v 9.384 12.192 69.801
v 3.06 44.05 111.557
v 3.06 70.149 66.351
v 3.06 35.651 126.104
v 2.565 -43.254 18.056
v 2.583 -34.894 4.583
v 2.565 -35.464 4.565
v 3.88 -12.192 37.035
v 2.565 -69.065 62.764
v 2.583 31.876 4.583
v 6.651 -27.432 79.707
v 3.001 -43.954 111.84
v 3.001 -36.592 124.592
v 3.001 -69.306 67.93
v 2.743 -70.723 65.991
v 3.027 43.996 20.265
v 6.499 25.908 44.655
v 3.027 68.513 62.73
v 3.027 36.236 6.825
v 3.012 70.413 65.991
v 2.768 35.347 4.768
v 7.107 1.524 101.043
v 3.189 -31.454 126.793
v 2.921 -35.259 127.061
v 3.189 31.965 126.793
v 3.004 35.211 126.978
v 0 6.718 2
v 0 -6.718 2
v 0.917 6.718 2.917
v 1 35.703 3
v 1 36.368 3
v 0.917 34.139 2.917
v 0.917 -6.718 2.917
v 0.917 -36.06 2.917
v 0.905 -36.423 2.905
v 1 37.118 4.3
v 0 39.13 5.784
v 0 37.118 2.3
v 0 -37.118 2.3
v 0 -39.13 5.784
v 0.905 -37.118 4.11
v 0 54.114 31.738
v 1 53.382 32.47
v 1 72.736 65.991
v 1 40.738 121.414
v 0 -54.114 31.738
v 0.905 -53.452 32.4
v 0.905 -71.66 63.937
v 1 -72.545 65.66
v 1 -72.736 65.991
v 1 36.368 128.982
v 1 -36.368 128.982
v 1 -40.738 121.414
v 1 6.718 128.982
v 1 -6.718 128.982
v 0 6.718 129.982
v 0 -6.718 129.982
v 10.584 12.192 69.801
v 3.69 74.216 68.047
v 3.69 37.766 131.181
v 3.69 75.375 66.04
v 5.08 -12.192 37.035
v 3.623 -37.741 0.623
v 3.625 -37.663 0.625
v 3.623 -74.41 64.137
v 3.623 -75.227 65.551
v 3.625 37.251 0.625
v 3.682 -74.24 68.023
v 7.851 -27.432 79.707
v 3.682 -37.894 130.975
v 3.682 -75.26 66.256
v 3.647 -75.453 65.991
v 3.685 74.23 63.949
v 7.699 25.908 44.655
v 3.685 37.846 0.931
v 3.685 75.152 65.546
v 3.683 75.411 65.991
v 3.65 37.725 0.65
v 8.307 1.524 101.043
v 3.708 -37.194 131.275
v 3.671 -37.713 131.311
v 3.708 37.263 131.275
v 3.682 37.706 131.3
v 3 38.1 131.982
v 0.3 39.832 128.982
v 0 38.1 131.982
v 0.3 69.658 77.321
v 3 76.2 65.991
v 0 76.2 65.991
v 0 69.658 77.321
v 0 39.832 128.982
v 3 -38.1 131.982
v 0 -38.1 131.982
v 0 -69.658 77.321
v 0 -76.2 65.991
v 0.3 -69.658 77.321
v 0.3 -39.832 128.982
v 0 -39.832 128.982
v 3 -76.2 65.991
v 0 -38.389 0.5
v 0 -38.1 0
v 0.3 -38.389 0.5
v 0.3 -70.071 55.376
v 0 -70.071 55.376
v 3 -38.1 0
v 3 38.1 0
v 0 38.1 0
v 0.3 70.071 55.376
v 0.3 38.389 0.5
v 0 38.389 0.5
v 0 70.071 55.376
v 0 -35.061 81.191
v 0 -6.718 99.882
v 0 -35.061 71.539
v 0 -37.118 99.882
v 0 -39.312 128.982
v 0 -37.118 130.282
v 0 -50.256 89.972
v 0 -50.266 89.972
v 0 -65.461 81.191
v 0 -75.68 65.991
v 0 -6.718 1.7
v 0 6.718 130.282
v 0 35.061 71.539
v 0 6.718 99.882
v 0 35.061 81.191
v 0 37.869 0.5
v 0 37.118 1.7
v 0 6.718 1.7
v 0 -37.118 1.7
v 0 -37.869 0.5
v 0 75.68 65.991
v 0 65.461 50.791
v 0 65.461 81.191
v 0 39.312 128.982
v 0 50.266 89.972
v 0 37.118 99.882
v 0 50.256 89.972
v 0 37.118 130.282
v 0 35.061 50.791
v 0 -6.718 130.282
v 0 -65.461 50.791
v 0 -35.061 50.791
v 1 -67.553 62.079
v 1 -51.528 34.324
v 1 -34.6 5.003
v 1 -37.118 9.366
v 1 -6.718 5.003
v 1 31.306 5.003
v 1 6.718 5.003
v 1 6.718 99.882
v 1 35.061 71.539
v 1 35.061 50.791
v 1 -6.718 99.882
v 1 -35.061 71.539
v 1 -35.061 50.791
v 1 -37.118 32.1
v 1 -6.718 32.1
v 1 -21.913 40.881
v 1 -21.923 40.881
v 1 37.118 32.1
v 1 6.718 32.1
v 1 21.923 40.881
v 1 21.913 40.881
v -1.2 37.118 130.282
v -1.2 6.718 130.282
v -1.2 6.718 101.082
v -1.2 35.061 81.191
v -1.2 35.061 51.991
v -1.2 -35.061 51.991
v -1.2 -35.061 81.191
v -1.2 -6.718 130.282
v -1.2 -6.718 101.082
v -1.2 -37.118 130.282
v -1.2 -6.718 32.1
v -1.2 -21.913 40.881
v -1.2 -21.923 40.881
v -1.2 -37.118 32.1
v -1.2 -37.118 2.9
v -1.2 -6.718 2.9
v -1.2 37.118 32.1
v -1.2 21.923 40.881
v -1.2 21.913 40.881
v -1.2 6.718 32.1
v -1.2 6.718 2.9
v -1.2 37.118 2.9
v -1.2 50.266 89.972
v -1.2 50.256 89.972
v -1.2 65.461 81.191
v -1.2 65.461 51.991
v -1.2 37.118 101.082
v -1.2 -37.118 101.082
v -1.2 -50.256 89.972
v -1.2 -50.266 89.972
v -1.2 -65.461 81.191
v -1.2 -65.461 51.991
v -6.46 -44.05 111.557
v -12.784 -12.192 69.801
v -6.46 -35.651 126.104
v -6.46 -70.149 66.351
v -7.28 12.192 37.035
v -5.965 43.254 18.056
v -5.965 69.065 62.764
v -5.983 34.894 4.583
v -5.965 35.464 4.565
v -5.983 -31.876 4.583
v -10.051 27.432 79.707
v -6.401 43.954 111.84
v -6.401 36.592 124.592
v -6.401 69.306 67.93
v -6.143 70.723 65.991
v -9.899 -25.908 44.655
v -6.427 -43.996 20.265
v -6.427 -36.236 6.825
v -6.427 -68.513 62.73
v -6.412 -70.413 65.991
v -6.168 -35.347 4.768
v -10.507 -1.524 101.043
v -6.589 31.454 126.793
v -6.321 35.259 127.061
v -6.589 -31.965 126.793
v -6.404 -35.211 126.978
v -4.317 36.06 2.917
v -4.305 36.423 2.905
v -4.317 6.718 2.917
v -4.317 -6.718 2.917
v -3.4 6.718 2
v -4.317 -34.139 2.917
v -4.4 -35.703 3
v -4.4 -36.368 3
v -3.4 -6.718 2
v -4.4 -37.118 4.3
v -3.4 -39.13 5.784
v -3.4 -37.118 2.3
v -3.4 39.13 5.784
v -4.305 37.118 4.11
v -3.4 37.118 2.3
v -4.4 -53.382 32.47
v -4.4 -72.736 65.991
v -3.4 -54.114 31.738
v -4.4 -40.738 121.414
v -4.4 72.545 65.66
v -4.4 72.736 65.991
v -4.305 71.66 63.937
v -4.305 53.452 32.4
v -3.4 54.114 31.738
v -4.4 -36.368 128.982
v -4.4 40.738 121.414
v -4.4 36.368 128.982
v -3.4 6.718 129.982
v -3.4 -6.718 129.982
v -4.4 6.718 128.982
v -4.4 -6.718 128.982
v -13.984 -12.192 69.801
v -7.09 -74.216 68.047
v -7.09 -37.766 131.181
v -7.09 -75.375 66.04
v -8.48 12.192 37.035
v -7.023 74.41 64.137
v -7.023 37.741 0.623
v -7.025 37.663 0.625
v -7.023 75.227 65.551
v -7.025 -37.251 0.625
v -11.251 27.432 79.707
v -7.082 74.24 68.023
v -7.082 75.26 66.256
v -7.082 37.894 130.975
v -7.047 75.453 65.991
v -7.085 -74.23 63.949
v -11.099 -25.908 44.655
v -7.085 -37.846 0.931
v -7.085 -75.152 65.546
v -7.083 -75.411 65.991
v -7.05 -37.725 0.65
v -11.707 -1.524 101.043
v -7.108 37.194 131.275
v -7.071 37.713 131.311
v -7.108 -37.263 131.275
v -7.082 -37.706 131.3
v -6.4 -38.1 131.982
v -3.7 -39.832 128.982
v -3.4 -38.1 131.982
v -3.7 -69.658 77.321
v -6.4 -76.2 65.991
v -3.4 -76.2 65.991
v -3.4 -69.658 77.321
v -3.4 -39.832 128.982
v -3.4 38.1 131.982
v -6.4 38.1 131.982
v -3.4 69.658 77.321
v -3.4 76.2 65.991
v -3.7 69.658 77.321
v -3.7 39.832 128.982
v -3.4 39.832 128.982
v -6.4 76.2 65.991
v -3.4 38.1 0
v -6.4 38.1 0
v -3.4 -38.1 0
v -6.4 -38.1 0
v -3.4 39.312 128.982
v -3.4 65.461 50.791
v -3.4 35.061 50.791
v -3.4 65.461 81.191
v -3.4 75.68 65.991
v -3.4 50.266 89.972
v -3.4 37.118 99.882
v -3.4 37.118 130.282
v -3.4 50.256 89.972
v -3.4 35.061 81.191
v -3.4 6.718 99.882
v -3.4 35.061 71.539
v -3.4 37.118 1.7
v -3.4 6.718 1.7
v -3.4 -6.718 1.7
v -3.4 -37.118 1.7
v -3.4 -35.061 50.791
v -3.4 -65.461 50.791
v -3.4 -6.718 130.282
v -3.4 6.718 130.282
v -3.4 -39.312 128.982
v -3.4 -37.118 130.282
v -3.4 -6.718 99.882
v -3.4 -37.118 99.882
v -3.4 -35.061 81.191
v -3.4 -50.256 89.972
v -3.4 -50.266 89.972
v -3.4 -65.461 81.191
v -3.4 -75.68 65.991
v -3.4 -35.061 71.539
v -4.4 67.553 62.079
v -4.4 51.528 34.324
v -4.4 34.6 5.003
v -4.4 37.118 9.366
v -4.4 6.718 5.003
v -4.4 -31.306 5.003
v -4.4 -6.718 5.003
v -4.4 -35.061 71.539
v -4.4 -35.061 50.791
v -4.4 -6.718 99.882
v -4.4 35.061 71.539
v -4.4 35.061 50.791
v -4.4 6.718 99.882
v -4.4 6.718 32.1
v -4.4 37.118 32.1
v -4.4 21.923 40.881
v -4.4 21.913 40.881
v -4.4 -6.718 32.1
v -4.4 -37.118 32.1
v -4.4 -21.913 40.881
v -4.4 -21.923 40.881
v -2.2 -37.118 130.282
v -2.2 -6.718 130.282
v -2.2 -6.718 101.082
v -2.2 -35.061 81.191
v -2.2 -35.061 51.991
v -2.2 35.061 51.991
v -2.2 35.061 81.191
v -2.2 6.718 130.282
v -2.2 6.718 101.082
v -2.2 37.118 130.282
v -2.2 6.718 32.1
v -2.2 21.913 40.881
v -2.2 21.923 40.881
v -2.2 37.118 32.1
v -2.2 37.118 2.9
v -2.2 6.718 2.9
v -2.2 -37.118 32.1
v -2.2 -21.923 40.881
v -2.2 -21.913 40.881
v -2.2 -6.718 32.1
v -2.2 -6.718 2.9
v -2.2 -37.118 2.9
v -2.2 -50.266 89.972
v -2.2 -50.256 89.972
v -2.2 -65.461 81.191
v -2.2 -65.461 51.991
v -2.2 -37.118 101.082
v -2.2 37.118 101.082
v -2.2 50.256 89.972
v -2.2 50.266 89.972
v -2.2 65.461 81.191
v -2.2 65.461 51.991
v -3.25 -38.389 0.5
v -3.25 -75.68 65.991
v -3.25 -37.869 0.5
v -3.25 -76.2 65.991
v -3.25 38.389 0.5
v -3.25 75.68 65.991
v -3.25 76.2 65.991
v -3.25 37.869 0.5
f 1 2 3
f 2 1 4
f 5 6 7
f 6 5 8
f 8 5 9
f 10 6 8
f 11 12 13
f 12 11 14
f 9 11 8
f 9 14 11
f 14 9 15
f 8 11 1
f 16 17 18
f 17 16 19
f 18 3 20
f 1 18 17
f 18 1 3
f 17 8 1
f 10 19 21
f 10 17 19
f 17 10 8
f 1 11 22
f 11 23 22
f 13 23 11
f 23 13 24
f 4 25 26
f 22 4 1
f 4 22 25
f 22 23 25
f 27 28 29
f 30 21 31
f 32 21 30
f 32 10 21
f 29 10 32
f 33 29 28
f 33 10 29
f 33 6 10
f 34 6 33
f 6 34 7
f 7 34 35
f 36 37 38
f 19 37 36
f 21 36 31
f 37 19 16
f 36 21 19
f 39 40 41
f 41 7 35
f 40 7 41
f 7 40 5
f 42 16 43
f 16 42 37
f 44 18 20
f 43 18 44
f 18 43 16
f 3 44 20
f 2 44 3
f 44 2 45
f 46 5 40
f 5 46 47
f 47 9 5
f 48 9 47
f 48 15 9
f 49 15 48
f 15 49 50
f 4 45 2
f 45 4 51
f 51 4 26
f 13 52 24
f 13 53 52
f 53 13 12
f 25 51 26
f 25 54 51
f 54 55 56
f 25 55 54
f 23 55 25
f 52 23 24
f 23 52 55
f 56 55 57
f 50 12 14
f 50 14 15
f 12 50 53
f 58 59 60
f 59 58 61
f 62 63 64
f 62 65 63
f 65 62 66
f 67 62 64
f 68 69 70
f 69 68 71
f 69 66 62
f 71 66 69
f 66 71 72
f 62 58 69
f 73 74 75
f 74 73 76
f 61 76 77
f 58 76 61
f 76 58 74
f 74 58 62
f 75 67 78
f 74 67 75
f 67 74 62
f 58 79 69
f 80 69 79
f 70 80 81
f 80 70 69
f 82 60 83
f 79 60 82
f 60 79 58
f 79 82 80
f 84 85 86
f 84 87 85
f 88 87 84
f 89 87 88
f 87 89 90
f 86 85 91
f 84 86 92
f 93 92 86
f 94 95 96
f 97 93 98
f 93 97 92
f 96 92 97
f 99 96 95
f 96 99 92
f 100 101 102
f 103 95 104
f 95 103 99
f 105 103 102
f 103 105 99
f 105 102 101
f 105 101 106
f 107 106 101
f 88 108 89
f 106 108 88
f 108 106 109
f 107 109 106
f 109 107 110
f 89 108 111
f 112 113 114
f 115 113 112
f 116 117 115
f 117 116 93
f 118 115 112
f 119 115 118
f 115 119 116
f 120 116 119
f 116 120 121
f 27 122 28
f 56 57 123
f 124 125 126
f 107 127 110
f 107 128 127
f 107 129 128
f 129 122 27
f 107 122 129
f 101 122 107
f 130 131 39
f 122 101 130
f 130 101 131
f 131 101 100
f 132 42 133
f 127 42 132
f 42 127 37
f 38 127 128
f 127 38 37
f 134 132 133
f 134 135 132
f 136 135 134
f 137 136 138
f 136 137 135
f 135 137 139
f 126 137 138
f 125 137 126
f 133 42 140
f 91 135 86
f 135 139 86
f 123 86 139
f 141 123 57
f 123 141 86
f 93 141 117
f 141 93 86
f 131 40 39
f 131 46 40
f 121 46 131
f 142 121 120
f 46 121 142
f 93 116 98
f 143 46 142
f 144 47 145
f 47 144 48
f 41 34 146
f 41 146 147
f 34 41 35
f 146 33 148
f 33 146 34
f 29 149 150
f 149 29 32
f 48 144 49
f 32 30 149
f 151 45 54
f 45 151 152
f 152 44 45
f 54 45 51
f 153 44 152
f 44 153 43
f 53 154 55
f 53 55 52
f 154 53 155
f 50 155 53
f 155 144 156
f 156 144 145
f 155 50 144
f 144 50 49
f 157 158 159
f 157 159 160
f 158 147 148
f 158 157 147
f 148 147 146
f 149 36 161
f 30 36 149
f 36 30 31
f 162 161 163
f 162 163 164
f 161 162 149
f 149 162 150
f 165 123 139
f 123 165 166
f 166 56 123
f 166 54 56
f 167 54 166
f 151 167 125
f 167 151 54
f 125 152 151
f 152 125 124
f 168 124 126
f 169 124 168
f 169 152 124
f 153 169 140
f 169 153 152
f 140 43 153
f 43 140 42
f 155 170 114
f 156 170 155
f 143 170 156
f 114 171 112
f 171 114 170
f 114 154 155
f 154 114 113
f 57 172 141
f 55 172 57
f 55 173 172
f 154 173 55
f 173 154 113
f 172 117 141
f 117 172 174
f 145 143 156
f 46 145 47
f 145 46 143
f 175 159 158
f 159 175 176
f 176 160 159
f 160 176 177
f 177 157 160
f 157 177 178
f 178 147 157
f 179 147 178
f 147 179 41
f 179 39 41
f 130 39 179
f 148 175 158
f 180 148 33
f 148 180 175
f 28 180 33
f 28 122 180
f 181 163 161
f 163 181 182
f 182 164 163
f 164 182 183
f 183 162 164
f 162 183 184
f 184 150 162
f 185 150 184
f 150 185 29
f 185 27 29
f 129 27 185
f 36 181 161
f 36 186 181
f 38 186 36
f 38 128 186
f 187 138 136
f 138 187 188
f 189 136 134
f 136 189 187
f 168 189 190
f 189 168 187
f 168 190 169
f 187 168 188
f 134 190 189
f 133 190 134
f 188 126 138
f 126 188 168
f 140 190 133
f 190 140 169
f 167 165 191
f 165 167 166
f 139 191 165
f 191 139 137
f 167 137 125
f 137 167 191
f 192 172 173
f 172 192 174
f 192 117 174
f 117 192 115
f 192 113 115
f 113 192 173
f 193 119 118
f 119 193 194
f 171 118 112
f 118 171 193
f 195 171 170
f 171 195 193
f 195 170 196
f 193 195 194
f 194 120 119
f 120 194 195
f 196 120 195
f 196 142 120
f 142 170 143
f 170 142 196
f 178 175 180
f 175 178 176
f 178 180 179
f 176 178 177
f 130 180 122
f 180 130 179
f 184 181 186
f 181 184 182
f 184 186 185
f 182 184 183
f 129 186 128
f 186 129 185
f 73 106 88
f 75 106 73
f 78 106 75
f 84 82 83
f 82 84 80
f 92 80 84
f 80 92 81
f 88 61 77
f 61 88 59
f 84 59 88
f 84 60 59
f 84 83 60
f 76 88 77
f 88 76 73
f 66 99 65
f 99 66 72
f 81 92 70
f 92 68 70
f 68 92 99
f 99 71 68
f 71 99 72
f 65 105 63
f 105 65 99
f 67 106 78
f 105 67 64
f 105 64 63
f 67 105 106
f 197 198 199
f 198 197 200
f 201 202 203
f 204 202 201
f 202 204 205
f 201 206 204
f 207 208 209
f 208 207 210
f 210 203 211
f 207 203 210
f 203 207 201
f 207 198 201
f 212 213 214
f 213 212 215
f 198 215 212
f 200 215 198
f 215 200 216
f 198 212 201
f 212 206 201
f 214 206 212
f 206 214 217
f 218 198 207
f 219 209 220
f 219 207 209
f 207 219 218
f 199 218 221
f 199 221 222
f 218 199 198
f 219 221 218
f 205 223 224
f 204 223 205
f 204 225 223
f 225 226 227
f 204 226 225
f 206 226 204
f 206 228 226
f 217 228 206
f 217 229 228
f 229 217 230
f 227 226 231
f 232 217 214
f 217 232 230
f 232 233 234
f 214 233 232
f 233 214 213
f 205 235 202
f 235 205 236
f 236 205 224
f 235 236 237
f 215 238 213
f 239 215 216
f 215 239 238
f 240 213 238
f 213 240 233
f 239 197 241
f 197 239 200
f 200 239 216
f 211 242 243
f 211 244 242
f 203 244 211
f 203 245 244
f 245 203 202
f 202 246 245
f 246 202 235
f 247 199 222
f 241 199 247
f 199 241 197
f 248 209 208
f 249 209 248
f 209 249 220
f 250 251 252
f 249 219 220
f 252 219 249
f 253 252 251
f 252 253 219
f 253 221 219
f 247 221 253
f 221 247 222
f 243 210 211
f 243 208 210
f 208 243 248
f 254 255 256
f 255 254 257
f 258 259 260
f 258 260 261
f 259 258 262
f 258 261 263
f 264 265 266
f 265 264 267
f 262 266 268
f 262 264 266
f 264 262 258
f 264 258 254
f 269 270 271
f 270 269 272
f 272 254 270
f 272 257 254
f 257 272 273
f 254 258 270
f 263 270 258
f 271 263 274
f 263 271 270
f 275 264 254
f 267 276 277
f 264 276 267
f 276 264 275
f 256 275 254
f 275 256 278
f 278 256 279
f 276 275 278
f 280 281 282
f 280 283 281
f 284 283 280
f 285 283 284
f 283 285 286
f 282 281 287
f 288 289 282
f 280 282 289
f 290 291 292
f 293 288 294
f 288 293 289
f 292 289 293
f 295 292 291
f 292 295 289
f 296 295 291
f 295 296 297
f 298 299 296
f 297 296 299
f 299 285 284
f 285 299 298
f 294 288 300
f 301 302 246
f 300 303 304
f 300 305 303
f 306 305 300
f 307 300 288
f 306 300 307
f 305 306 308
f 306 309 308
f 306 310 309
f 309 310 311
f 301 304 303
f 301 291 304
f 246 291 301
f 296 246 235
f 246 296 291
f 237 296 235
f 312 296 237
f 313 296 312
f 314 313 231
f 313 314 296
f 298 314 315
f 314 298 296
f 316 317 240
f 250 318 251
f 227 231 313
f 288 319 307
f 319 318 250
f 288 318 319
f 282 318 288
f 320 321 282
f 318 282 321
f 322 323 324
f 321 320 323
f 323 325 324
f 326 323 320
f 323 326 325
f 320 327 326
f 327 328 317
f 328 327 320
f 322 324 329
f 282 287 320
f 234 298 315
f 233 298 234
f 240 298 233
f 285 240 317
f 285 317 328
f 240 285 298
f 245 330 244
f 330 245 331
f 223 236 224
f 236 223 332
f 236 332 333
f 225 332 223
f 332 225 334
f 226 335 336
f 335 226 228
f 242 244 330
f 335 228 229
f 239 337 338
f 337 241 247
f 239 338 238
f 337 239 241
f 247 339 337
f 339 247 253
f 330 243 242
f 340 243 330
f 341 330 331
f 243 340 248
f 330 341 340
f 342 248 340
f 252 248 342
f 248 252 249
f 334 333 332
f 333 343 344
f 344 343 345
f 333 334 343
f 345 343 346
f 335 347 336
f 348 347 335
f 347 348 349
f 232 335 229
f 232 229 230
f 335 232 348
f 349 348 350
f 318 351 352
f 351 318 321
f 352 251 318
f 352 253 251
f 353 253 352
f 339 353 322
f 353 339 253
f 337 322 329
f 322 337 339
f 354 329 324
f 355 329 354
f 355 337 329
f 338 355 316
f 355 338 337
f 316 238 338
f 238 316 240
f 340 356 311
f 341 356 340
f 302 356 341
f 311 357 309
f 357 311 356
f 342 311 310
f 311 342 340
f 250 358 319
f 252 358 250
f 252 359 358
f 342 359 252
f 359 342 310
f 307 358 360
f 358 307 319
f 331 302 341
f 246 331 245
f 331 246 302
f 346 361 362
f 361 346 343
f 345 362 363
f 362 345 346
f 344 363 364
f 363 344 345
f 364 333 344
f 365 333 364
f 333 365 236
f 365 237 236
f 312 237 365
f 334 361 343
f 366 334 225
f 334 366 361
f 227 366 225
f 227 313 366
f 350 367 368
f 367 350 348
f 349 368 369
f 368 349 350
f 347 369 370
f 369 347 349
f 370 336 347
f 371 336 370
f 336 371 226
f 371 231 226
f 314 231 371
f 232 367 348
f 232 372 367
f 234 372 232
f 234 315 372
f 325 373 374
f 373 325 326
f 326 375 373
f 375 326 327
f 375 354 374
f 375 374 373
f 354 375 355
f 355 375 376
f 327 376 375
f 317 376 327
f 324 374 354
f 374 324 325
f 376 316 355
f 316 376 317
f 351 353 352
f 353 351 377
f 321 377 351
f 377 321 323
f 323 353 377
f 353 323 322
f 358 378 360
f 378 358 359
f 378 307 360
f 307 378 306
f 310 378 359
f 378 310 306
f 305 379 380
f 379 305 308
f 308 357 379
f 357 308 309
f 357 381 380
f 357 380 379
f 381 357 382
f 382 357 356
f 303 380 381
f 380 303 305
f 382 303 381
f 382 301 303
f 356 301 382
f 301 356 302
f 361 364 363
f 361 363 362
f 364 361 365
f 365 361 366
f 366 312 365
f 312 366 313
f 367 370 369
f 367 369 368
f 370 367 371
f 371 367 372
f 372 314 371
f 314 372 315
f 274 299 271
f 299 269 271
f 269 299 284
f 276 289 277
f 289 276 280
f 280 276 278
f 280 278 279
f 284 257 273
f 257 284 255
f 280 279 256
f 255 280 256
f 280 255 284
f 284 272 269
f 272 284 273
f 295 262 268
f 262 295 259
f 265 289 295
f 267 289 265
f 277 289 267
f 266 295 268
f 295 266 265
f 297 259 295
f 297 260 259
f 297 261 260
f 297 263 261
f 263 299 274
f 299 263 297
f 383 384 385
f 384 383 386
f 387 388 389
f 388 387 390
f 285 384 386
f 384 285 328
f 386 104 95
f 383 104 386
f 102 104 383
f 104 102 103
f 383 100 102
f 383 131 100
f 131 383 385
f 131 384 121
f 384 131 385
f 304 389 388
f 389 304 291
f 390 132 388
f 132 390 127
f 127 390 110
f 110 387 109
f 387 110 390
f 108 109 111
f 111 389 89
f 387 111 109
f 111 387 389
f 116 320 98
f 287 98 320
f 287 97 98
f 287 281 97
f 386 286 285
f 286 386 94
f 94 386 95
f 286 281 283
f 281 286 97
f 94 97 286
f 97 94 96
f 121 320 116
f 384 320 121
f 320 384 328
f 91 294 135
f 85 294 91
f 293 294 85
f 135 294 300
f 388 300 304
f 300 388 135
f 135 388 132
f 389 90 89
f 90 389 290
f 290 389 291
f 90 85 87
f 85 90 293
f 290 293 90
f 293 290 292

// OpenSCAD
// Hexagon wall tile v53 — parametric rebuild of v30
// Front: identical low-poly facets to v30 (same facet angles at every size).
// Edge profile: identical on every size (edge depth, rim width) so tiles butt flush.
// Back: six corner pads for 1" (25 mm) double-sided mounting tape.
// v32: tape pads are flat plates hung from the rim with an air gap to the front skin.
// v33: thinner skin + thinner pads so the air gap is 1.4 mm even right at the edges
//      (v32 had only 0.8 mm there and showed marks along the slanted edges).
// v34: snap-off stabilizer fins behind the bottom edge so the tall, thin tile can't tip over
//      while printing. Break them off afterwards (bend sideways) and the back stays flat.
// v35: 0.6 mm 45° chamfer on the front edge (crisp, consistent shadow line between tiles; hides
//      first-layer squish and brim trim marks) + relief_scale to deepen the facets if wanted.
// v37: much smaller breakaway tabs (0.8 x 0.6 mm, every 8 mm) so the fins snap off easily.
// v38: full-height snap-off BRACE FRAME behind the tile: a thin hex ring + X/vertical bars,
//      1 mm behind the back, tied to the tile rim by tiny tabs all the way round (incl. the top).
//      Tile + brace act as a stiff box while printing; the fins now sit on the brace.
//      Peel the brace off after printing — the tabs only touch the back rim.
// v39: PAIR mode (default): two identical tiles printed back-to-back, 0.4 mm apart, so each
//      cradles the other full-height. Only 12 tiny tabs (corners + mid-sides) join the back
//      rims — twist/peel the tiles apart. No brace, no fins, almost no waste. The pair is
//      turned 90° on the bed so the 'back' seam lands on a side edge, not on either face.
// v40: pair tabs spaced evenly every ~pair_tab_pitch mm round the rim on EVERY size. In v39 the
//      tab spacing grew with the tile (3": ~23 mm max gap, 6": ~46 mm, 10": ~79 mm), so the 3" pair
//      printed perfectly but the 6" rims flexed apart between tabs and broke up above mid-height.
//      Now every size has the same tab spacing as a stiff 3" pair (or tighter).
// v42: tabs replaced by one continuous hairline SEAM round the outer edge of the pair gap.
//      Discrete tabs changed the toolpath on every layer that had a tab, leaving a faint line
//      across the tile every ~10 mm of height. With a continuous seam every layer has the same
//      shape, so there is nothing to print differently. Separate the tiles by running a utility
//      knife along the seam line on the edges, then twist apart.
// v43: stiffer tape pads — each pad now grows from the back plane toward the front until it is
//      pad_gap (1.4 mm) from the skin, instead of being a 1 mm plate (the skin stays untouched, so
//      no ghost lines). Larger tiles (>= mid_pad_min_in)
//      get four extra pads at the slanted mid-edges: 10 tape spots on the 10".
// v44: UNIFORM pads. Every pad is the same PAD x PAD tape square, pushed snug into its corner
//      (touching both rims), with only a small 45° gusset beneath it down to the rim so it prints
//      without support. Because a hex corner is the same angle at every size, the 6" and 10" pads
//      are identical in shape and size; the 3" uses the same layout with smaller squares.
//      The 10" adds the same square at the middle of each slanted edge.
// v46: pads are a 1 mm plate with a stiffening LIP round the free edges (like a shallow tray),
//      instead of solid-filled — nearly the stiffness of v44's deep pads at close to v42 print time.
// v47: pair gap 0.4 -> 1.0 mm. At 0.4 mm the squashed back walls of the two tiles touched and
//      fused, so v42-v46 pairs would not come apart. At 1.0 mm only the hairline edge seam joins
//      them: cut it with a utility knife (there is now room for the blade) and they separate.
// v48: seam only on the four SLANTED edges. The top and bottom flat edges are left open (a 1 mm
//      slot), so a putty knife / flat screwdriver can go in and pry the pair open, unzipping the
//      seam. Every layer still crosses the seam at both ends, so the layer shape stays constant.
// v49: "KISS" seam — the seam is printed on ONE tile only and stops seam_kiss short of the other
//      tile's back. The two tiles are never one solid: they only touch where the plastic squashes
//      out, which tacks them lightly (enough to steady them while printing, weak enough to snap by
//      hand). Set seam_kiss = 0 to go back to the fused v48 seam.
// v50: (1) every tape pad gets a 45° pointed top, so pads taper out over many layers instead of
//      ending on one layer. Abrupt pad ends changed the layer time suddenly and left a line across
//      the face (seen at ~14% and ~36% height on the 10").
//      (2) the stiffening lips stay lip_gap (2.5 mm) clear of the skin, not 1.4: near the edges the
//      lips were hugging the skin and ghosting through as ridges parallel to the edge.
// v51: STIFFER, LARGER TAPE PADS without touching the front edge profile:
//      - each tape SQUARE stands pad_proud (1.2 mm) proud of the back rim, so where the tape goes
//        the pad is ~2.2 mm thick (was 1 mm) — roughly 8-10x stiffer. The tile sits on its pads;
//        the rim floats ~1.2 mm + tape thickness off the wall. Support webs stay thin (print time).
//      - pads 30 mm square (fit 1" tape with margin), with a shallow 30° roof instead of a point.
//      - front kept cleaner: pads now stay pad_gap = 1.6 mm from the skin; no lips.
//      - pair gap grows to keep 1 mm between the two tiles' proud pads.
//      - seam now starts right at the bottom corners (no cantilevered start); pry slot along the top.
// v53: seam is FUSED (one printed line) on the two upper slanted edges and stays a light-contact
//      kiss seam on the lower two. The top half is where the pair wobbled (ripples near the top
//      corners); the switch happens at mid-height, where the hex corners already turn.
//      Separate: knife in the top slot, run down both upper edges, twist apart.
// Prints upright on a flat edge with NO supports (every downward edge is 45° or steeper).
//
// Export one size at a time, e.g.:
//   openscad -D size_in=6 -o hex_pair_v53_6in.stl hex_wall_tile_v53.scad

/* [Size] */
size_in       = 6;      // point-to-point width in inches (3, 6, 10 ...)

/* [Edge profile — keep identical across sizes] */
// Space behind the skin at the edge = edge_depth - skin; it must be >= pad_plate + pad_gap + pad_recess.
edge_depth    = 3.6;    // depth of the outer edge, back plane to front face (mm)
rim           = 2.0;    // perimeter wall thickness at the back plane (mm)
front_chamfer = 0.6;    // 45° chamfer on the front edge (mm); 0 = sharp edge

/* [Look] */
relief_scale  = 1.0;    // 1.0 = v30 facets; 1.5 = 50% deeper facets (same edge profile on all sizes)

/* [Front skin] */
skin          = 1.2;    // front skin thickness (mm) — 3 lines at 0.4 mm, same on all sizes

/* [Tape pads] */
tape_width    = 25.4;   // tape width (mm)
pad_margin    = 5;      // extra pad width beyond the tape (mm) -> 30.4 mm pads
pad_max_frac  = 0.45;   // pad never larger than this fraction of the tile radius (keeps 3" usable)
pad_plate     = 1.0;    // pad thickness in front of the back plane (mm), less where the skin is close
pad_proud     = 1.2;    // pads stand this far behind the back rim (mm) -> extra stiffness, no effect on the front
roof_angle    = 30;     // slope of the pad tops (deg) — tapers the pad end over several mm of height
pad_depth     = 0;         // stiffening lip depth (mm); always stops pad_gap from the skin
lip_gap       = 2.5;    // lips stop this far from the skin (plates keep pad_gap)
pad_lip       = 0.9;    // lip thickness (mm) — two lines
mid_pad_min_in = 8;     // tiles this size or larger also get pads at the four slanted mid-edges
pad_gap       = 1.6;    // minimum air gap between pads and the front skin (mm) — keeps the front clean
pad_recess    = 0;      // pads set back from the rim (mm); >0 lets the rim touch the wall,
                        // but near the edges the plate is then trimmed thinner to keep pad_gap

/* [Print stabilizers (snap off after printing)] */
stabilizers   = false;  // v34-v38 option; not needed in pair mode
fin_count     = 2;      // fins behind the bottom edge, placed symmetrically
fin_thick     = 1.6;    // fin thickness (mm)
fin_height_frac = 0.35; // fin height as a fraction of the tile height
fin_depth_frac  = 0.4;  // fin depth behind the brace as a fraction of fin height
fin_depth_min   = 15;   // (mm)
fin_gap       = 0.5;    // air gap between fin and tile back (mm)
tab_height    = 0.6;    // breakaway tab height (mm, vertical when printing) — 3 layers at 0.2
tab_width     = 0.8;    // breakaway tab width (mm), centred on the fin — 2 lines
tab_pitch     = 8;      // spacing between tabs (mm)

/* [Full-height brace frame (snap off after printing)] */
brace         = false;  // v38 option; not needed in pair mode
brace_gap     = 1.0;    // air gap between tile back and brace (mm)
brace_thick   = 1.6;    // brace thickness (mm)
brace_rim_w   = 4;      // width of the brace's hex ring (mm)
brace_bar_w   = 3;      // width of the X and vertical bars (mm)
brace_tab_pitch = 10;   // spacing of brace tabs along each rim side (mm)
brace_tab     = 0.8;    // brace tab size (mm) — tiny, so the brace peels off

/* [Back-to-back pair (default)] */
pair          = true;
pad_clear     = 1.0;    // air between the two tiles' proud pads (mm)
pair_gap      = pad_clear + 2*pad_proud;   // gap between the two back planes (mm)
pair_tab      = 0.6;    // tab size (mm) — tiny, so the pair twists apart
pair_tab_pitch = 12;    // (v40 tabs, unused when pair_seam_w > 0)
pair_seam_w   = 0.45;   // width of the continuous edge seam bridging the gap (mm) — about one line
seam_kiss     = 0.15;   // gap between the seam tip and the other tile (mm); 0 = fused seam
upper_fused   = true;   // v53: fuse the seam on the two upper slanted edges only
seam_open     = 3;      // leave the seam off this far from the top and bottom flat edges (mm) -> pry slots

/* [Output] */
orient_for_print = true; // stand upright on a flat edge, back facing +Y

/* [Hidden] */
R   = size_in * 25.4 / 2;         // corner radius
AP  = R * cos(30);                // apothem
PAD = min(tape_width + pad_margin, R * pad_max_frac);

// Normalised front geometry from v30 (x, y in units of R; z = relief above edge, units of R)
FP = [[1,0,0],[0.5,0.866025,0],[-0.5,0.866025,0],[-1,0,0],[-0.5,-0.866025,0],[0.5,-0.866025,0],
      [0.16,0.05,0.091654],[-0.16,-0.38,0.019428],[-0.36,0.18,0.05579],[0.34,-0.28,0.053795],[0.02,0.46,0.061766]];
FACES = [[0,6,1],[4,3,7],[5,4,7],[8,3,2],[7,3,8],[7,8,6],[5,9,0],[9,6,0],[9,7,6],[5,7,9],
         [6,8,10],[8,2,10],[6,10,1],[10,2,1],
         [1,12,11,0],[2,13,12,1],[3,14,13,2],[4,15,14,3],[5,16,15,4],[0,11,16,5],
         [11,12,13,14,15,16]];
RELIEF_MAX = 0.091654 * R * relief_scale;
D = edge_depth + RELIEF_MAX + 1;  // max depth used for chamfers

// Solid bounded by the faceted front (shifted by dz) and a flat back at z = zb
module body(dz = 0, zb = 0) {
    pts = concat(
        [for (p = FP) [p[0]*R, p[1]*R, edge_depth + p[2]*R*relief_scale + dz]],
        [for (i = [0:5]) [FP[i][0]*R, FP[i][1]*R, zb]]);
    polyhedron(points = pts, faces = FACES, convexity = 4);
}

module hex2d(apothem) { circle(r = apothem / cos(30), $fn = 6); }

// Back cavity: behind the skin, inside the rim; rim inner faces slope 45° so nothing needs support
module cavity(extra = 0) {
    H  = D + 2;
    a0 = AP - rim - extra + 1;             // apothem at z = -1
    intersection() {
        body(dz = -skin - extra, zb = -1);
        translate([0, 0, -1]) linear_extrude(height = H, scale = (a0 - H) / a0) hex2d(a0);
    }
}

// ---- Uniform tape pads ----------------------------------------------------------------
PA = AP - rim + 0.3;                    // inner apothem used for pads (0.3 mm overlap fuses them to the rim)
PH = PAD / 2;
function nrm(a) = [cos(a), sin(a)];
function lim(a) = PA - PH * (abs(cos(a)) + abs(sin(a)));     // max n.c for an axis-aligned PAD square
// centre of a PAD square snug in the corner at angle t (touches the two rims meeting there)
function corner_c(t) = let(n1 = nrm(t - 30), n2 = nrm(t + 30), b1 = lim(t - 30), b2 = lim(t + 30), d = sin(60))
    [(b1*n2[1] - b2*n1[1]) / d, (n1[0]*b2 - n2[0]*b1) / d];
// centre of a PAD square snug against the middle of the edge whose normal is at angle a
function edge_c(a) = lim(a) * nrm(a);
// downward 45° (or vertical) gusset direction toward the nearest rim below — printed upright, model -y is down
function gdir(t) = (cos(t) > 0.1) ? [1, -1] : (cos(t) < -0.1) ? [-1, -1] : [0, -1];

module pad_sq(c, dir) {
    intersection() {
        hex2d(PA);
        hull() {
            translate(c) square(PAD, center = true);
            translate(c + [0, PAD/2 + PAD/2*tan(roof_angle)]) square(0.01, center = true);   // shallow roof
            translate(c + dir * R) square(PAD, center = true);
        }
    }
}
module pad_fp(k)  { t = 60*k;      pad_sq(corner_c(t), (k == 4 || k == 5) ? [0, -1] : gdir(t)); }
module mid_fp(k)  { a = 30 + 60*k; pad_sq(edge_c(a),   (k == 3 || k == 5) ? [0, -1] : gdir(a)); }

module pad_fps() {
    for (k = [0:5]) pad_fp(k);
    if (size_in >= mid_pad_min_in) for (k = [0, 2, 3, 5]) mid_fp(k);
}
// proud part of one tape square: only the square itself (not its support web), with a 45° ramp
// at its lower edge so, printed upright, it grows out of the plate instead of starting as a ledge
module proud_sq(c) {
    intersection() {
        translate([0, 0, -pad_proud]) linear_extrude(pad_proud + 0.01)
            intersection() {
                hex2d(PA);
                hull() { translate(c) square(PAD, center = true);
                         translate(c + [0, PAD/2 + PAD/2*tan(roof_angle)]) square(0.01, center = true); }
            }
        translate([0, c[1] - PAD/2, 0])
            multmatrix([[1,0,0,0],[0,1,-1,0],[0,0,1,0]]) translate([-2*R, 0, -5]) cube([4*R, 4*R, 10]);
    }
}
module pads() {
    intersection() {                                       // tape plate in front of the back plane, pad_gap from the skin
        body(dz = -skin - pad_gap, zb = -1);
        linear_extrude(pad_plate) pad_fps();
    }
    for (k = [0:5]) proud_sq(corner_c(60*k));              // stiff proud tape squares behind it
    if (size_in >= mid_pad_min_in) for (k = [0, 2, 3, 5]) proud_sq(edge_c(30 + 60*k));
}

module chamfer_clip() {
    HB = D + 5;
    union() {
        translate([0, 0, -2]) linear_extrude(edge_depth - front_chamfer + 2) hex2d(AP + 1);
        translate([0, 0, edge_depth - front_chamfer]) linear_extrude(height = HB, scale = (AP - HB) / AP) hex2d(AP);
    }
}

module tile() {
    intersection() {
        union() {
            difference() { body(); cavity(); }
            pads();
        }
        if (front_chamfer > 0) chamfer_clip(); else translate([-2*R, -2*R, -5]) cube([4*R, 4*R, 4*R]);
    }
}

// Triangular fins standing on the bed behind the back (model z < 0), joined to the tile by small tabs
FIN_H = fin_height_frac * 2 * AP;
FIN_L = max(fin_depth_min, fin_depth_frac * FIN_H);
function fin_x(i) = (fin_count == 1) ? 0 : (-1 + 2 * i / (fin_count - 1)) * 0.35 * R;
BZ = brace ? brace_gap + brace_thick : 0;          // fins start behind the brace when it is used
module stabilizer_fins() {
    for (i = [0 : fin_count - 1]) {
        x = fin_x(i);
        fg = brace ? BZ - 0.3 : fin_gap;                // with a brace: fused into it (no tabs needed)
        hull() {                                            // fin: vertical triangle
            translate([x - fin_thick/2, -AP, -fg - FIN_L]) cube([fin_thick, 0.01, FIN_L]);
            translate([x - fin_thick/2, -AP, -fg - 0.01]) cube([fin_thick, FIN_H, 0.01]);
        }
        if (!brace)
            for (y = [0 : tab_pitch : FIN_H - tab_height])  // breakaway tabs into the back plane
                translate([x - tab_width/2, -AP + y, -fin_gap - 0.05]) cube([tab_width, tab_height, fin_gap + 0.35]);
    }
}

// Brace frame (2D, in the tile plane). Printed upright, so every downward-facing edge is >= 45°:
// the top bar is carried by 45° roofs in the two top windows; bars run vertical or at ±60°.
module brace_2d() {
    W  = brace_rim_w;
    Yt = AP - W;                                        // underside of the top ring bar
    difference() {
        hex2d(AP);
        intersection() {                                // the open window, with a 45° roof under the top bar
            hex2d(AP - W);
            // only the two top windows touch the top bar: give them a 45° valley roof
            polygon([[-2*R, -2*R], [2*R, -2*R], [2*R, 2*R], [R/2, 2*R], [R/2, Yt],
                     [0, Yt - R/2], [-R/2, Yt], [-R/2, 2*R], [-2*R, 2*R]]);
        }
    }
    intersection() {
        hex2d(AP);
        union() {
            square([brace_bar_w, 2*AP], center = true);                 // vertical bar
            rotate(60)  square([4*R, brace_bar_w], center = true);      // ±60° diagonals (corner to corner)
            rotate(-60) square([4*R, brace_bar_w], center = true);
        }
    }
}

module brace_frame() {
    translate([0, 0, -BZ]) linear_extrude(brace_thick) brace_2d();
    // tiny tabs across the gap, on the tile's back rim (1 mm in from the outline), all six sides
    for (k = [0:5]) {
        a0 = 60*k; a1 = 60*(k+1);
        p0 = [ (R - 1/sin(60)) * cos(a0), (R - 1/sin(60)) * sin(a0) ];
        p1 = [ (R - 1/sin(60)) * cos(a1), (R - 1/sin(60)) * sin(a1) ];
        L  = norm(p1 - p0);
        n  = floor((L - 6) / brace_tab_pitch);
        for (j = [0 : n]) {
            t = (3 + j * (L - 6) / max(n, 1)) / L;
            p = p0 + t * (p1 - p0);
            translate([p[0], p[1], -brace_gap - 0.3]) rotate(a0 + 120)
                translate([-brace_tab/2, -brace_tab/2, 0]) cube([brace_tab, brace_tab, brace_gap + 0.6]);
        }
    }
}

// Tabs across the pair gap, evenly spaced along each rim side (1 mm in from the outline)
module pair_tabs() {
    rr = R - 1/sin(60);
    n  = max(2, ceil(rr / pair_tab_pitch));          // side length = rr
    for (k = [0:5]) for (i = [0:n-1]) {
        f  = (i + 0.5) / n;
        a0 = 60*k; a1 = 60*(k+1);
        p = [rr*cos(a0), rr*sin(a0)] + f * ([rr*cos(a1), rr*sin(a1)] - [rr*cos(a0), rr*sin(a0)]);
        translate([p[0], p[1], -pair_gap - 0.3]) rotate(a0 + 120)
            translate([-pair_tab/2, -pair_tab/2, 0]) cube([pair_tab, pair_tab, pair_gap + 0.6]);
    }
}
// Continuous hairline seam round the outline, bridging the gap between the two back planes
// Seam strip along the slanted edges, between z0 (partner side) and +0.3 (into this tile)
module seam_strip(z0, ylo, yhi) {
    translate([0, 0, z0]) linear_extrude(0.3 - z0)
        intersection() {
            difference() { hex2d(AP); hex2d(AP - pair_seam_w); }
            translate([-2*R, ylo]) square([4*R, yhi - ylo]);
        }
}
module pair_seam() {
    ybot = -AP + pair_seam_w + 0.05;       // just off the bed (bottom corners)
    ytop =  AP - seam_open;                // top pry slot
    // lower half: light-contact "kiss" seam (stops seam_kiss short of the partner)
    seam_strip((seam_kiss > 0) ? -pair_gap + seam_kiss : -pair_gap - 0.3, ybot, 0);
    // upper half: fused hairline seam (one printed line) — braces the top, where the pair wobbles
    seam_strip(upper_fused ? -pair_gap - 0.3 : -pair_gap + seam_kiss, 0, ytop);
}
module partner() { translate([0, 0, -pair_gap]) rotate([0, 180, 0]) tile(); }   // same tile turned round, not mirrored

module assembly() {
    tile();
    if (pair) { partner(); if (pair_seam_w > 0) pair_seam(); else pair_tabs(); }
    else { if (brace) brace_frame(); if (stabilizers) stabilizer_fins(); }
}

if (orient_for_print)
    rotate([0, 0, pair ? 90 : 0]) translate([0, 0, AP]) rotate([90, 0, 0]) assembly();
else
    assembly();
